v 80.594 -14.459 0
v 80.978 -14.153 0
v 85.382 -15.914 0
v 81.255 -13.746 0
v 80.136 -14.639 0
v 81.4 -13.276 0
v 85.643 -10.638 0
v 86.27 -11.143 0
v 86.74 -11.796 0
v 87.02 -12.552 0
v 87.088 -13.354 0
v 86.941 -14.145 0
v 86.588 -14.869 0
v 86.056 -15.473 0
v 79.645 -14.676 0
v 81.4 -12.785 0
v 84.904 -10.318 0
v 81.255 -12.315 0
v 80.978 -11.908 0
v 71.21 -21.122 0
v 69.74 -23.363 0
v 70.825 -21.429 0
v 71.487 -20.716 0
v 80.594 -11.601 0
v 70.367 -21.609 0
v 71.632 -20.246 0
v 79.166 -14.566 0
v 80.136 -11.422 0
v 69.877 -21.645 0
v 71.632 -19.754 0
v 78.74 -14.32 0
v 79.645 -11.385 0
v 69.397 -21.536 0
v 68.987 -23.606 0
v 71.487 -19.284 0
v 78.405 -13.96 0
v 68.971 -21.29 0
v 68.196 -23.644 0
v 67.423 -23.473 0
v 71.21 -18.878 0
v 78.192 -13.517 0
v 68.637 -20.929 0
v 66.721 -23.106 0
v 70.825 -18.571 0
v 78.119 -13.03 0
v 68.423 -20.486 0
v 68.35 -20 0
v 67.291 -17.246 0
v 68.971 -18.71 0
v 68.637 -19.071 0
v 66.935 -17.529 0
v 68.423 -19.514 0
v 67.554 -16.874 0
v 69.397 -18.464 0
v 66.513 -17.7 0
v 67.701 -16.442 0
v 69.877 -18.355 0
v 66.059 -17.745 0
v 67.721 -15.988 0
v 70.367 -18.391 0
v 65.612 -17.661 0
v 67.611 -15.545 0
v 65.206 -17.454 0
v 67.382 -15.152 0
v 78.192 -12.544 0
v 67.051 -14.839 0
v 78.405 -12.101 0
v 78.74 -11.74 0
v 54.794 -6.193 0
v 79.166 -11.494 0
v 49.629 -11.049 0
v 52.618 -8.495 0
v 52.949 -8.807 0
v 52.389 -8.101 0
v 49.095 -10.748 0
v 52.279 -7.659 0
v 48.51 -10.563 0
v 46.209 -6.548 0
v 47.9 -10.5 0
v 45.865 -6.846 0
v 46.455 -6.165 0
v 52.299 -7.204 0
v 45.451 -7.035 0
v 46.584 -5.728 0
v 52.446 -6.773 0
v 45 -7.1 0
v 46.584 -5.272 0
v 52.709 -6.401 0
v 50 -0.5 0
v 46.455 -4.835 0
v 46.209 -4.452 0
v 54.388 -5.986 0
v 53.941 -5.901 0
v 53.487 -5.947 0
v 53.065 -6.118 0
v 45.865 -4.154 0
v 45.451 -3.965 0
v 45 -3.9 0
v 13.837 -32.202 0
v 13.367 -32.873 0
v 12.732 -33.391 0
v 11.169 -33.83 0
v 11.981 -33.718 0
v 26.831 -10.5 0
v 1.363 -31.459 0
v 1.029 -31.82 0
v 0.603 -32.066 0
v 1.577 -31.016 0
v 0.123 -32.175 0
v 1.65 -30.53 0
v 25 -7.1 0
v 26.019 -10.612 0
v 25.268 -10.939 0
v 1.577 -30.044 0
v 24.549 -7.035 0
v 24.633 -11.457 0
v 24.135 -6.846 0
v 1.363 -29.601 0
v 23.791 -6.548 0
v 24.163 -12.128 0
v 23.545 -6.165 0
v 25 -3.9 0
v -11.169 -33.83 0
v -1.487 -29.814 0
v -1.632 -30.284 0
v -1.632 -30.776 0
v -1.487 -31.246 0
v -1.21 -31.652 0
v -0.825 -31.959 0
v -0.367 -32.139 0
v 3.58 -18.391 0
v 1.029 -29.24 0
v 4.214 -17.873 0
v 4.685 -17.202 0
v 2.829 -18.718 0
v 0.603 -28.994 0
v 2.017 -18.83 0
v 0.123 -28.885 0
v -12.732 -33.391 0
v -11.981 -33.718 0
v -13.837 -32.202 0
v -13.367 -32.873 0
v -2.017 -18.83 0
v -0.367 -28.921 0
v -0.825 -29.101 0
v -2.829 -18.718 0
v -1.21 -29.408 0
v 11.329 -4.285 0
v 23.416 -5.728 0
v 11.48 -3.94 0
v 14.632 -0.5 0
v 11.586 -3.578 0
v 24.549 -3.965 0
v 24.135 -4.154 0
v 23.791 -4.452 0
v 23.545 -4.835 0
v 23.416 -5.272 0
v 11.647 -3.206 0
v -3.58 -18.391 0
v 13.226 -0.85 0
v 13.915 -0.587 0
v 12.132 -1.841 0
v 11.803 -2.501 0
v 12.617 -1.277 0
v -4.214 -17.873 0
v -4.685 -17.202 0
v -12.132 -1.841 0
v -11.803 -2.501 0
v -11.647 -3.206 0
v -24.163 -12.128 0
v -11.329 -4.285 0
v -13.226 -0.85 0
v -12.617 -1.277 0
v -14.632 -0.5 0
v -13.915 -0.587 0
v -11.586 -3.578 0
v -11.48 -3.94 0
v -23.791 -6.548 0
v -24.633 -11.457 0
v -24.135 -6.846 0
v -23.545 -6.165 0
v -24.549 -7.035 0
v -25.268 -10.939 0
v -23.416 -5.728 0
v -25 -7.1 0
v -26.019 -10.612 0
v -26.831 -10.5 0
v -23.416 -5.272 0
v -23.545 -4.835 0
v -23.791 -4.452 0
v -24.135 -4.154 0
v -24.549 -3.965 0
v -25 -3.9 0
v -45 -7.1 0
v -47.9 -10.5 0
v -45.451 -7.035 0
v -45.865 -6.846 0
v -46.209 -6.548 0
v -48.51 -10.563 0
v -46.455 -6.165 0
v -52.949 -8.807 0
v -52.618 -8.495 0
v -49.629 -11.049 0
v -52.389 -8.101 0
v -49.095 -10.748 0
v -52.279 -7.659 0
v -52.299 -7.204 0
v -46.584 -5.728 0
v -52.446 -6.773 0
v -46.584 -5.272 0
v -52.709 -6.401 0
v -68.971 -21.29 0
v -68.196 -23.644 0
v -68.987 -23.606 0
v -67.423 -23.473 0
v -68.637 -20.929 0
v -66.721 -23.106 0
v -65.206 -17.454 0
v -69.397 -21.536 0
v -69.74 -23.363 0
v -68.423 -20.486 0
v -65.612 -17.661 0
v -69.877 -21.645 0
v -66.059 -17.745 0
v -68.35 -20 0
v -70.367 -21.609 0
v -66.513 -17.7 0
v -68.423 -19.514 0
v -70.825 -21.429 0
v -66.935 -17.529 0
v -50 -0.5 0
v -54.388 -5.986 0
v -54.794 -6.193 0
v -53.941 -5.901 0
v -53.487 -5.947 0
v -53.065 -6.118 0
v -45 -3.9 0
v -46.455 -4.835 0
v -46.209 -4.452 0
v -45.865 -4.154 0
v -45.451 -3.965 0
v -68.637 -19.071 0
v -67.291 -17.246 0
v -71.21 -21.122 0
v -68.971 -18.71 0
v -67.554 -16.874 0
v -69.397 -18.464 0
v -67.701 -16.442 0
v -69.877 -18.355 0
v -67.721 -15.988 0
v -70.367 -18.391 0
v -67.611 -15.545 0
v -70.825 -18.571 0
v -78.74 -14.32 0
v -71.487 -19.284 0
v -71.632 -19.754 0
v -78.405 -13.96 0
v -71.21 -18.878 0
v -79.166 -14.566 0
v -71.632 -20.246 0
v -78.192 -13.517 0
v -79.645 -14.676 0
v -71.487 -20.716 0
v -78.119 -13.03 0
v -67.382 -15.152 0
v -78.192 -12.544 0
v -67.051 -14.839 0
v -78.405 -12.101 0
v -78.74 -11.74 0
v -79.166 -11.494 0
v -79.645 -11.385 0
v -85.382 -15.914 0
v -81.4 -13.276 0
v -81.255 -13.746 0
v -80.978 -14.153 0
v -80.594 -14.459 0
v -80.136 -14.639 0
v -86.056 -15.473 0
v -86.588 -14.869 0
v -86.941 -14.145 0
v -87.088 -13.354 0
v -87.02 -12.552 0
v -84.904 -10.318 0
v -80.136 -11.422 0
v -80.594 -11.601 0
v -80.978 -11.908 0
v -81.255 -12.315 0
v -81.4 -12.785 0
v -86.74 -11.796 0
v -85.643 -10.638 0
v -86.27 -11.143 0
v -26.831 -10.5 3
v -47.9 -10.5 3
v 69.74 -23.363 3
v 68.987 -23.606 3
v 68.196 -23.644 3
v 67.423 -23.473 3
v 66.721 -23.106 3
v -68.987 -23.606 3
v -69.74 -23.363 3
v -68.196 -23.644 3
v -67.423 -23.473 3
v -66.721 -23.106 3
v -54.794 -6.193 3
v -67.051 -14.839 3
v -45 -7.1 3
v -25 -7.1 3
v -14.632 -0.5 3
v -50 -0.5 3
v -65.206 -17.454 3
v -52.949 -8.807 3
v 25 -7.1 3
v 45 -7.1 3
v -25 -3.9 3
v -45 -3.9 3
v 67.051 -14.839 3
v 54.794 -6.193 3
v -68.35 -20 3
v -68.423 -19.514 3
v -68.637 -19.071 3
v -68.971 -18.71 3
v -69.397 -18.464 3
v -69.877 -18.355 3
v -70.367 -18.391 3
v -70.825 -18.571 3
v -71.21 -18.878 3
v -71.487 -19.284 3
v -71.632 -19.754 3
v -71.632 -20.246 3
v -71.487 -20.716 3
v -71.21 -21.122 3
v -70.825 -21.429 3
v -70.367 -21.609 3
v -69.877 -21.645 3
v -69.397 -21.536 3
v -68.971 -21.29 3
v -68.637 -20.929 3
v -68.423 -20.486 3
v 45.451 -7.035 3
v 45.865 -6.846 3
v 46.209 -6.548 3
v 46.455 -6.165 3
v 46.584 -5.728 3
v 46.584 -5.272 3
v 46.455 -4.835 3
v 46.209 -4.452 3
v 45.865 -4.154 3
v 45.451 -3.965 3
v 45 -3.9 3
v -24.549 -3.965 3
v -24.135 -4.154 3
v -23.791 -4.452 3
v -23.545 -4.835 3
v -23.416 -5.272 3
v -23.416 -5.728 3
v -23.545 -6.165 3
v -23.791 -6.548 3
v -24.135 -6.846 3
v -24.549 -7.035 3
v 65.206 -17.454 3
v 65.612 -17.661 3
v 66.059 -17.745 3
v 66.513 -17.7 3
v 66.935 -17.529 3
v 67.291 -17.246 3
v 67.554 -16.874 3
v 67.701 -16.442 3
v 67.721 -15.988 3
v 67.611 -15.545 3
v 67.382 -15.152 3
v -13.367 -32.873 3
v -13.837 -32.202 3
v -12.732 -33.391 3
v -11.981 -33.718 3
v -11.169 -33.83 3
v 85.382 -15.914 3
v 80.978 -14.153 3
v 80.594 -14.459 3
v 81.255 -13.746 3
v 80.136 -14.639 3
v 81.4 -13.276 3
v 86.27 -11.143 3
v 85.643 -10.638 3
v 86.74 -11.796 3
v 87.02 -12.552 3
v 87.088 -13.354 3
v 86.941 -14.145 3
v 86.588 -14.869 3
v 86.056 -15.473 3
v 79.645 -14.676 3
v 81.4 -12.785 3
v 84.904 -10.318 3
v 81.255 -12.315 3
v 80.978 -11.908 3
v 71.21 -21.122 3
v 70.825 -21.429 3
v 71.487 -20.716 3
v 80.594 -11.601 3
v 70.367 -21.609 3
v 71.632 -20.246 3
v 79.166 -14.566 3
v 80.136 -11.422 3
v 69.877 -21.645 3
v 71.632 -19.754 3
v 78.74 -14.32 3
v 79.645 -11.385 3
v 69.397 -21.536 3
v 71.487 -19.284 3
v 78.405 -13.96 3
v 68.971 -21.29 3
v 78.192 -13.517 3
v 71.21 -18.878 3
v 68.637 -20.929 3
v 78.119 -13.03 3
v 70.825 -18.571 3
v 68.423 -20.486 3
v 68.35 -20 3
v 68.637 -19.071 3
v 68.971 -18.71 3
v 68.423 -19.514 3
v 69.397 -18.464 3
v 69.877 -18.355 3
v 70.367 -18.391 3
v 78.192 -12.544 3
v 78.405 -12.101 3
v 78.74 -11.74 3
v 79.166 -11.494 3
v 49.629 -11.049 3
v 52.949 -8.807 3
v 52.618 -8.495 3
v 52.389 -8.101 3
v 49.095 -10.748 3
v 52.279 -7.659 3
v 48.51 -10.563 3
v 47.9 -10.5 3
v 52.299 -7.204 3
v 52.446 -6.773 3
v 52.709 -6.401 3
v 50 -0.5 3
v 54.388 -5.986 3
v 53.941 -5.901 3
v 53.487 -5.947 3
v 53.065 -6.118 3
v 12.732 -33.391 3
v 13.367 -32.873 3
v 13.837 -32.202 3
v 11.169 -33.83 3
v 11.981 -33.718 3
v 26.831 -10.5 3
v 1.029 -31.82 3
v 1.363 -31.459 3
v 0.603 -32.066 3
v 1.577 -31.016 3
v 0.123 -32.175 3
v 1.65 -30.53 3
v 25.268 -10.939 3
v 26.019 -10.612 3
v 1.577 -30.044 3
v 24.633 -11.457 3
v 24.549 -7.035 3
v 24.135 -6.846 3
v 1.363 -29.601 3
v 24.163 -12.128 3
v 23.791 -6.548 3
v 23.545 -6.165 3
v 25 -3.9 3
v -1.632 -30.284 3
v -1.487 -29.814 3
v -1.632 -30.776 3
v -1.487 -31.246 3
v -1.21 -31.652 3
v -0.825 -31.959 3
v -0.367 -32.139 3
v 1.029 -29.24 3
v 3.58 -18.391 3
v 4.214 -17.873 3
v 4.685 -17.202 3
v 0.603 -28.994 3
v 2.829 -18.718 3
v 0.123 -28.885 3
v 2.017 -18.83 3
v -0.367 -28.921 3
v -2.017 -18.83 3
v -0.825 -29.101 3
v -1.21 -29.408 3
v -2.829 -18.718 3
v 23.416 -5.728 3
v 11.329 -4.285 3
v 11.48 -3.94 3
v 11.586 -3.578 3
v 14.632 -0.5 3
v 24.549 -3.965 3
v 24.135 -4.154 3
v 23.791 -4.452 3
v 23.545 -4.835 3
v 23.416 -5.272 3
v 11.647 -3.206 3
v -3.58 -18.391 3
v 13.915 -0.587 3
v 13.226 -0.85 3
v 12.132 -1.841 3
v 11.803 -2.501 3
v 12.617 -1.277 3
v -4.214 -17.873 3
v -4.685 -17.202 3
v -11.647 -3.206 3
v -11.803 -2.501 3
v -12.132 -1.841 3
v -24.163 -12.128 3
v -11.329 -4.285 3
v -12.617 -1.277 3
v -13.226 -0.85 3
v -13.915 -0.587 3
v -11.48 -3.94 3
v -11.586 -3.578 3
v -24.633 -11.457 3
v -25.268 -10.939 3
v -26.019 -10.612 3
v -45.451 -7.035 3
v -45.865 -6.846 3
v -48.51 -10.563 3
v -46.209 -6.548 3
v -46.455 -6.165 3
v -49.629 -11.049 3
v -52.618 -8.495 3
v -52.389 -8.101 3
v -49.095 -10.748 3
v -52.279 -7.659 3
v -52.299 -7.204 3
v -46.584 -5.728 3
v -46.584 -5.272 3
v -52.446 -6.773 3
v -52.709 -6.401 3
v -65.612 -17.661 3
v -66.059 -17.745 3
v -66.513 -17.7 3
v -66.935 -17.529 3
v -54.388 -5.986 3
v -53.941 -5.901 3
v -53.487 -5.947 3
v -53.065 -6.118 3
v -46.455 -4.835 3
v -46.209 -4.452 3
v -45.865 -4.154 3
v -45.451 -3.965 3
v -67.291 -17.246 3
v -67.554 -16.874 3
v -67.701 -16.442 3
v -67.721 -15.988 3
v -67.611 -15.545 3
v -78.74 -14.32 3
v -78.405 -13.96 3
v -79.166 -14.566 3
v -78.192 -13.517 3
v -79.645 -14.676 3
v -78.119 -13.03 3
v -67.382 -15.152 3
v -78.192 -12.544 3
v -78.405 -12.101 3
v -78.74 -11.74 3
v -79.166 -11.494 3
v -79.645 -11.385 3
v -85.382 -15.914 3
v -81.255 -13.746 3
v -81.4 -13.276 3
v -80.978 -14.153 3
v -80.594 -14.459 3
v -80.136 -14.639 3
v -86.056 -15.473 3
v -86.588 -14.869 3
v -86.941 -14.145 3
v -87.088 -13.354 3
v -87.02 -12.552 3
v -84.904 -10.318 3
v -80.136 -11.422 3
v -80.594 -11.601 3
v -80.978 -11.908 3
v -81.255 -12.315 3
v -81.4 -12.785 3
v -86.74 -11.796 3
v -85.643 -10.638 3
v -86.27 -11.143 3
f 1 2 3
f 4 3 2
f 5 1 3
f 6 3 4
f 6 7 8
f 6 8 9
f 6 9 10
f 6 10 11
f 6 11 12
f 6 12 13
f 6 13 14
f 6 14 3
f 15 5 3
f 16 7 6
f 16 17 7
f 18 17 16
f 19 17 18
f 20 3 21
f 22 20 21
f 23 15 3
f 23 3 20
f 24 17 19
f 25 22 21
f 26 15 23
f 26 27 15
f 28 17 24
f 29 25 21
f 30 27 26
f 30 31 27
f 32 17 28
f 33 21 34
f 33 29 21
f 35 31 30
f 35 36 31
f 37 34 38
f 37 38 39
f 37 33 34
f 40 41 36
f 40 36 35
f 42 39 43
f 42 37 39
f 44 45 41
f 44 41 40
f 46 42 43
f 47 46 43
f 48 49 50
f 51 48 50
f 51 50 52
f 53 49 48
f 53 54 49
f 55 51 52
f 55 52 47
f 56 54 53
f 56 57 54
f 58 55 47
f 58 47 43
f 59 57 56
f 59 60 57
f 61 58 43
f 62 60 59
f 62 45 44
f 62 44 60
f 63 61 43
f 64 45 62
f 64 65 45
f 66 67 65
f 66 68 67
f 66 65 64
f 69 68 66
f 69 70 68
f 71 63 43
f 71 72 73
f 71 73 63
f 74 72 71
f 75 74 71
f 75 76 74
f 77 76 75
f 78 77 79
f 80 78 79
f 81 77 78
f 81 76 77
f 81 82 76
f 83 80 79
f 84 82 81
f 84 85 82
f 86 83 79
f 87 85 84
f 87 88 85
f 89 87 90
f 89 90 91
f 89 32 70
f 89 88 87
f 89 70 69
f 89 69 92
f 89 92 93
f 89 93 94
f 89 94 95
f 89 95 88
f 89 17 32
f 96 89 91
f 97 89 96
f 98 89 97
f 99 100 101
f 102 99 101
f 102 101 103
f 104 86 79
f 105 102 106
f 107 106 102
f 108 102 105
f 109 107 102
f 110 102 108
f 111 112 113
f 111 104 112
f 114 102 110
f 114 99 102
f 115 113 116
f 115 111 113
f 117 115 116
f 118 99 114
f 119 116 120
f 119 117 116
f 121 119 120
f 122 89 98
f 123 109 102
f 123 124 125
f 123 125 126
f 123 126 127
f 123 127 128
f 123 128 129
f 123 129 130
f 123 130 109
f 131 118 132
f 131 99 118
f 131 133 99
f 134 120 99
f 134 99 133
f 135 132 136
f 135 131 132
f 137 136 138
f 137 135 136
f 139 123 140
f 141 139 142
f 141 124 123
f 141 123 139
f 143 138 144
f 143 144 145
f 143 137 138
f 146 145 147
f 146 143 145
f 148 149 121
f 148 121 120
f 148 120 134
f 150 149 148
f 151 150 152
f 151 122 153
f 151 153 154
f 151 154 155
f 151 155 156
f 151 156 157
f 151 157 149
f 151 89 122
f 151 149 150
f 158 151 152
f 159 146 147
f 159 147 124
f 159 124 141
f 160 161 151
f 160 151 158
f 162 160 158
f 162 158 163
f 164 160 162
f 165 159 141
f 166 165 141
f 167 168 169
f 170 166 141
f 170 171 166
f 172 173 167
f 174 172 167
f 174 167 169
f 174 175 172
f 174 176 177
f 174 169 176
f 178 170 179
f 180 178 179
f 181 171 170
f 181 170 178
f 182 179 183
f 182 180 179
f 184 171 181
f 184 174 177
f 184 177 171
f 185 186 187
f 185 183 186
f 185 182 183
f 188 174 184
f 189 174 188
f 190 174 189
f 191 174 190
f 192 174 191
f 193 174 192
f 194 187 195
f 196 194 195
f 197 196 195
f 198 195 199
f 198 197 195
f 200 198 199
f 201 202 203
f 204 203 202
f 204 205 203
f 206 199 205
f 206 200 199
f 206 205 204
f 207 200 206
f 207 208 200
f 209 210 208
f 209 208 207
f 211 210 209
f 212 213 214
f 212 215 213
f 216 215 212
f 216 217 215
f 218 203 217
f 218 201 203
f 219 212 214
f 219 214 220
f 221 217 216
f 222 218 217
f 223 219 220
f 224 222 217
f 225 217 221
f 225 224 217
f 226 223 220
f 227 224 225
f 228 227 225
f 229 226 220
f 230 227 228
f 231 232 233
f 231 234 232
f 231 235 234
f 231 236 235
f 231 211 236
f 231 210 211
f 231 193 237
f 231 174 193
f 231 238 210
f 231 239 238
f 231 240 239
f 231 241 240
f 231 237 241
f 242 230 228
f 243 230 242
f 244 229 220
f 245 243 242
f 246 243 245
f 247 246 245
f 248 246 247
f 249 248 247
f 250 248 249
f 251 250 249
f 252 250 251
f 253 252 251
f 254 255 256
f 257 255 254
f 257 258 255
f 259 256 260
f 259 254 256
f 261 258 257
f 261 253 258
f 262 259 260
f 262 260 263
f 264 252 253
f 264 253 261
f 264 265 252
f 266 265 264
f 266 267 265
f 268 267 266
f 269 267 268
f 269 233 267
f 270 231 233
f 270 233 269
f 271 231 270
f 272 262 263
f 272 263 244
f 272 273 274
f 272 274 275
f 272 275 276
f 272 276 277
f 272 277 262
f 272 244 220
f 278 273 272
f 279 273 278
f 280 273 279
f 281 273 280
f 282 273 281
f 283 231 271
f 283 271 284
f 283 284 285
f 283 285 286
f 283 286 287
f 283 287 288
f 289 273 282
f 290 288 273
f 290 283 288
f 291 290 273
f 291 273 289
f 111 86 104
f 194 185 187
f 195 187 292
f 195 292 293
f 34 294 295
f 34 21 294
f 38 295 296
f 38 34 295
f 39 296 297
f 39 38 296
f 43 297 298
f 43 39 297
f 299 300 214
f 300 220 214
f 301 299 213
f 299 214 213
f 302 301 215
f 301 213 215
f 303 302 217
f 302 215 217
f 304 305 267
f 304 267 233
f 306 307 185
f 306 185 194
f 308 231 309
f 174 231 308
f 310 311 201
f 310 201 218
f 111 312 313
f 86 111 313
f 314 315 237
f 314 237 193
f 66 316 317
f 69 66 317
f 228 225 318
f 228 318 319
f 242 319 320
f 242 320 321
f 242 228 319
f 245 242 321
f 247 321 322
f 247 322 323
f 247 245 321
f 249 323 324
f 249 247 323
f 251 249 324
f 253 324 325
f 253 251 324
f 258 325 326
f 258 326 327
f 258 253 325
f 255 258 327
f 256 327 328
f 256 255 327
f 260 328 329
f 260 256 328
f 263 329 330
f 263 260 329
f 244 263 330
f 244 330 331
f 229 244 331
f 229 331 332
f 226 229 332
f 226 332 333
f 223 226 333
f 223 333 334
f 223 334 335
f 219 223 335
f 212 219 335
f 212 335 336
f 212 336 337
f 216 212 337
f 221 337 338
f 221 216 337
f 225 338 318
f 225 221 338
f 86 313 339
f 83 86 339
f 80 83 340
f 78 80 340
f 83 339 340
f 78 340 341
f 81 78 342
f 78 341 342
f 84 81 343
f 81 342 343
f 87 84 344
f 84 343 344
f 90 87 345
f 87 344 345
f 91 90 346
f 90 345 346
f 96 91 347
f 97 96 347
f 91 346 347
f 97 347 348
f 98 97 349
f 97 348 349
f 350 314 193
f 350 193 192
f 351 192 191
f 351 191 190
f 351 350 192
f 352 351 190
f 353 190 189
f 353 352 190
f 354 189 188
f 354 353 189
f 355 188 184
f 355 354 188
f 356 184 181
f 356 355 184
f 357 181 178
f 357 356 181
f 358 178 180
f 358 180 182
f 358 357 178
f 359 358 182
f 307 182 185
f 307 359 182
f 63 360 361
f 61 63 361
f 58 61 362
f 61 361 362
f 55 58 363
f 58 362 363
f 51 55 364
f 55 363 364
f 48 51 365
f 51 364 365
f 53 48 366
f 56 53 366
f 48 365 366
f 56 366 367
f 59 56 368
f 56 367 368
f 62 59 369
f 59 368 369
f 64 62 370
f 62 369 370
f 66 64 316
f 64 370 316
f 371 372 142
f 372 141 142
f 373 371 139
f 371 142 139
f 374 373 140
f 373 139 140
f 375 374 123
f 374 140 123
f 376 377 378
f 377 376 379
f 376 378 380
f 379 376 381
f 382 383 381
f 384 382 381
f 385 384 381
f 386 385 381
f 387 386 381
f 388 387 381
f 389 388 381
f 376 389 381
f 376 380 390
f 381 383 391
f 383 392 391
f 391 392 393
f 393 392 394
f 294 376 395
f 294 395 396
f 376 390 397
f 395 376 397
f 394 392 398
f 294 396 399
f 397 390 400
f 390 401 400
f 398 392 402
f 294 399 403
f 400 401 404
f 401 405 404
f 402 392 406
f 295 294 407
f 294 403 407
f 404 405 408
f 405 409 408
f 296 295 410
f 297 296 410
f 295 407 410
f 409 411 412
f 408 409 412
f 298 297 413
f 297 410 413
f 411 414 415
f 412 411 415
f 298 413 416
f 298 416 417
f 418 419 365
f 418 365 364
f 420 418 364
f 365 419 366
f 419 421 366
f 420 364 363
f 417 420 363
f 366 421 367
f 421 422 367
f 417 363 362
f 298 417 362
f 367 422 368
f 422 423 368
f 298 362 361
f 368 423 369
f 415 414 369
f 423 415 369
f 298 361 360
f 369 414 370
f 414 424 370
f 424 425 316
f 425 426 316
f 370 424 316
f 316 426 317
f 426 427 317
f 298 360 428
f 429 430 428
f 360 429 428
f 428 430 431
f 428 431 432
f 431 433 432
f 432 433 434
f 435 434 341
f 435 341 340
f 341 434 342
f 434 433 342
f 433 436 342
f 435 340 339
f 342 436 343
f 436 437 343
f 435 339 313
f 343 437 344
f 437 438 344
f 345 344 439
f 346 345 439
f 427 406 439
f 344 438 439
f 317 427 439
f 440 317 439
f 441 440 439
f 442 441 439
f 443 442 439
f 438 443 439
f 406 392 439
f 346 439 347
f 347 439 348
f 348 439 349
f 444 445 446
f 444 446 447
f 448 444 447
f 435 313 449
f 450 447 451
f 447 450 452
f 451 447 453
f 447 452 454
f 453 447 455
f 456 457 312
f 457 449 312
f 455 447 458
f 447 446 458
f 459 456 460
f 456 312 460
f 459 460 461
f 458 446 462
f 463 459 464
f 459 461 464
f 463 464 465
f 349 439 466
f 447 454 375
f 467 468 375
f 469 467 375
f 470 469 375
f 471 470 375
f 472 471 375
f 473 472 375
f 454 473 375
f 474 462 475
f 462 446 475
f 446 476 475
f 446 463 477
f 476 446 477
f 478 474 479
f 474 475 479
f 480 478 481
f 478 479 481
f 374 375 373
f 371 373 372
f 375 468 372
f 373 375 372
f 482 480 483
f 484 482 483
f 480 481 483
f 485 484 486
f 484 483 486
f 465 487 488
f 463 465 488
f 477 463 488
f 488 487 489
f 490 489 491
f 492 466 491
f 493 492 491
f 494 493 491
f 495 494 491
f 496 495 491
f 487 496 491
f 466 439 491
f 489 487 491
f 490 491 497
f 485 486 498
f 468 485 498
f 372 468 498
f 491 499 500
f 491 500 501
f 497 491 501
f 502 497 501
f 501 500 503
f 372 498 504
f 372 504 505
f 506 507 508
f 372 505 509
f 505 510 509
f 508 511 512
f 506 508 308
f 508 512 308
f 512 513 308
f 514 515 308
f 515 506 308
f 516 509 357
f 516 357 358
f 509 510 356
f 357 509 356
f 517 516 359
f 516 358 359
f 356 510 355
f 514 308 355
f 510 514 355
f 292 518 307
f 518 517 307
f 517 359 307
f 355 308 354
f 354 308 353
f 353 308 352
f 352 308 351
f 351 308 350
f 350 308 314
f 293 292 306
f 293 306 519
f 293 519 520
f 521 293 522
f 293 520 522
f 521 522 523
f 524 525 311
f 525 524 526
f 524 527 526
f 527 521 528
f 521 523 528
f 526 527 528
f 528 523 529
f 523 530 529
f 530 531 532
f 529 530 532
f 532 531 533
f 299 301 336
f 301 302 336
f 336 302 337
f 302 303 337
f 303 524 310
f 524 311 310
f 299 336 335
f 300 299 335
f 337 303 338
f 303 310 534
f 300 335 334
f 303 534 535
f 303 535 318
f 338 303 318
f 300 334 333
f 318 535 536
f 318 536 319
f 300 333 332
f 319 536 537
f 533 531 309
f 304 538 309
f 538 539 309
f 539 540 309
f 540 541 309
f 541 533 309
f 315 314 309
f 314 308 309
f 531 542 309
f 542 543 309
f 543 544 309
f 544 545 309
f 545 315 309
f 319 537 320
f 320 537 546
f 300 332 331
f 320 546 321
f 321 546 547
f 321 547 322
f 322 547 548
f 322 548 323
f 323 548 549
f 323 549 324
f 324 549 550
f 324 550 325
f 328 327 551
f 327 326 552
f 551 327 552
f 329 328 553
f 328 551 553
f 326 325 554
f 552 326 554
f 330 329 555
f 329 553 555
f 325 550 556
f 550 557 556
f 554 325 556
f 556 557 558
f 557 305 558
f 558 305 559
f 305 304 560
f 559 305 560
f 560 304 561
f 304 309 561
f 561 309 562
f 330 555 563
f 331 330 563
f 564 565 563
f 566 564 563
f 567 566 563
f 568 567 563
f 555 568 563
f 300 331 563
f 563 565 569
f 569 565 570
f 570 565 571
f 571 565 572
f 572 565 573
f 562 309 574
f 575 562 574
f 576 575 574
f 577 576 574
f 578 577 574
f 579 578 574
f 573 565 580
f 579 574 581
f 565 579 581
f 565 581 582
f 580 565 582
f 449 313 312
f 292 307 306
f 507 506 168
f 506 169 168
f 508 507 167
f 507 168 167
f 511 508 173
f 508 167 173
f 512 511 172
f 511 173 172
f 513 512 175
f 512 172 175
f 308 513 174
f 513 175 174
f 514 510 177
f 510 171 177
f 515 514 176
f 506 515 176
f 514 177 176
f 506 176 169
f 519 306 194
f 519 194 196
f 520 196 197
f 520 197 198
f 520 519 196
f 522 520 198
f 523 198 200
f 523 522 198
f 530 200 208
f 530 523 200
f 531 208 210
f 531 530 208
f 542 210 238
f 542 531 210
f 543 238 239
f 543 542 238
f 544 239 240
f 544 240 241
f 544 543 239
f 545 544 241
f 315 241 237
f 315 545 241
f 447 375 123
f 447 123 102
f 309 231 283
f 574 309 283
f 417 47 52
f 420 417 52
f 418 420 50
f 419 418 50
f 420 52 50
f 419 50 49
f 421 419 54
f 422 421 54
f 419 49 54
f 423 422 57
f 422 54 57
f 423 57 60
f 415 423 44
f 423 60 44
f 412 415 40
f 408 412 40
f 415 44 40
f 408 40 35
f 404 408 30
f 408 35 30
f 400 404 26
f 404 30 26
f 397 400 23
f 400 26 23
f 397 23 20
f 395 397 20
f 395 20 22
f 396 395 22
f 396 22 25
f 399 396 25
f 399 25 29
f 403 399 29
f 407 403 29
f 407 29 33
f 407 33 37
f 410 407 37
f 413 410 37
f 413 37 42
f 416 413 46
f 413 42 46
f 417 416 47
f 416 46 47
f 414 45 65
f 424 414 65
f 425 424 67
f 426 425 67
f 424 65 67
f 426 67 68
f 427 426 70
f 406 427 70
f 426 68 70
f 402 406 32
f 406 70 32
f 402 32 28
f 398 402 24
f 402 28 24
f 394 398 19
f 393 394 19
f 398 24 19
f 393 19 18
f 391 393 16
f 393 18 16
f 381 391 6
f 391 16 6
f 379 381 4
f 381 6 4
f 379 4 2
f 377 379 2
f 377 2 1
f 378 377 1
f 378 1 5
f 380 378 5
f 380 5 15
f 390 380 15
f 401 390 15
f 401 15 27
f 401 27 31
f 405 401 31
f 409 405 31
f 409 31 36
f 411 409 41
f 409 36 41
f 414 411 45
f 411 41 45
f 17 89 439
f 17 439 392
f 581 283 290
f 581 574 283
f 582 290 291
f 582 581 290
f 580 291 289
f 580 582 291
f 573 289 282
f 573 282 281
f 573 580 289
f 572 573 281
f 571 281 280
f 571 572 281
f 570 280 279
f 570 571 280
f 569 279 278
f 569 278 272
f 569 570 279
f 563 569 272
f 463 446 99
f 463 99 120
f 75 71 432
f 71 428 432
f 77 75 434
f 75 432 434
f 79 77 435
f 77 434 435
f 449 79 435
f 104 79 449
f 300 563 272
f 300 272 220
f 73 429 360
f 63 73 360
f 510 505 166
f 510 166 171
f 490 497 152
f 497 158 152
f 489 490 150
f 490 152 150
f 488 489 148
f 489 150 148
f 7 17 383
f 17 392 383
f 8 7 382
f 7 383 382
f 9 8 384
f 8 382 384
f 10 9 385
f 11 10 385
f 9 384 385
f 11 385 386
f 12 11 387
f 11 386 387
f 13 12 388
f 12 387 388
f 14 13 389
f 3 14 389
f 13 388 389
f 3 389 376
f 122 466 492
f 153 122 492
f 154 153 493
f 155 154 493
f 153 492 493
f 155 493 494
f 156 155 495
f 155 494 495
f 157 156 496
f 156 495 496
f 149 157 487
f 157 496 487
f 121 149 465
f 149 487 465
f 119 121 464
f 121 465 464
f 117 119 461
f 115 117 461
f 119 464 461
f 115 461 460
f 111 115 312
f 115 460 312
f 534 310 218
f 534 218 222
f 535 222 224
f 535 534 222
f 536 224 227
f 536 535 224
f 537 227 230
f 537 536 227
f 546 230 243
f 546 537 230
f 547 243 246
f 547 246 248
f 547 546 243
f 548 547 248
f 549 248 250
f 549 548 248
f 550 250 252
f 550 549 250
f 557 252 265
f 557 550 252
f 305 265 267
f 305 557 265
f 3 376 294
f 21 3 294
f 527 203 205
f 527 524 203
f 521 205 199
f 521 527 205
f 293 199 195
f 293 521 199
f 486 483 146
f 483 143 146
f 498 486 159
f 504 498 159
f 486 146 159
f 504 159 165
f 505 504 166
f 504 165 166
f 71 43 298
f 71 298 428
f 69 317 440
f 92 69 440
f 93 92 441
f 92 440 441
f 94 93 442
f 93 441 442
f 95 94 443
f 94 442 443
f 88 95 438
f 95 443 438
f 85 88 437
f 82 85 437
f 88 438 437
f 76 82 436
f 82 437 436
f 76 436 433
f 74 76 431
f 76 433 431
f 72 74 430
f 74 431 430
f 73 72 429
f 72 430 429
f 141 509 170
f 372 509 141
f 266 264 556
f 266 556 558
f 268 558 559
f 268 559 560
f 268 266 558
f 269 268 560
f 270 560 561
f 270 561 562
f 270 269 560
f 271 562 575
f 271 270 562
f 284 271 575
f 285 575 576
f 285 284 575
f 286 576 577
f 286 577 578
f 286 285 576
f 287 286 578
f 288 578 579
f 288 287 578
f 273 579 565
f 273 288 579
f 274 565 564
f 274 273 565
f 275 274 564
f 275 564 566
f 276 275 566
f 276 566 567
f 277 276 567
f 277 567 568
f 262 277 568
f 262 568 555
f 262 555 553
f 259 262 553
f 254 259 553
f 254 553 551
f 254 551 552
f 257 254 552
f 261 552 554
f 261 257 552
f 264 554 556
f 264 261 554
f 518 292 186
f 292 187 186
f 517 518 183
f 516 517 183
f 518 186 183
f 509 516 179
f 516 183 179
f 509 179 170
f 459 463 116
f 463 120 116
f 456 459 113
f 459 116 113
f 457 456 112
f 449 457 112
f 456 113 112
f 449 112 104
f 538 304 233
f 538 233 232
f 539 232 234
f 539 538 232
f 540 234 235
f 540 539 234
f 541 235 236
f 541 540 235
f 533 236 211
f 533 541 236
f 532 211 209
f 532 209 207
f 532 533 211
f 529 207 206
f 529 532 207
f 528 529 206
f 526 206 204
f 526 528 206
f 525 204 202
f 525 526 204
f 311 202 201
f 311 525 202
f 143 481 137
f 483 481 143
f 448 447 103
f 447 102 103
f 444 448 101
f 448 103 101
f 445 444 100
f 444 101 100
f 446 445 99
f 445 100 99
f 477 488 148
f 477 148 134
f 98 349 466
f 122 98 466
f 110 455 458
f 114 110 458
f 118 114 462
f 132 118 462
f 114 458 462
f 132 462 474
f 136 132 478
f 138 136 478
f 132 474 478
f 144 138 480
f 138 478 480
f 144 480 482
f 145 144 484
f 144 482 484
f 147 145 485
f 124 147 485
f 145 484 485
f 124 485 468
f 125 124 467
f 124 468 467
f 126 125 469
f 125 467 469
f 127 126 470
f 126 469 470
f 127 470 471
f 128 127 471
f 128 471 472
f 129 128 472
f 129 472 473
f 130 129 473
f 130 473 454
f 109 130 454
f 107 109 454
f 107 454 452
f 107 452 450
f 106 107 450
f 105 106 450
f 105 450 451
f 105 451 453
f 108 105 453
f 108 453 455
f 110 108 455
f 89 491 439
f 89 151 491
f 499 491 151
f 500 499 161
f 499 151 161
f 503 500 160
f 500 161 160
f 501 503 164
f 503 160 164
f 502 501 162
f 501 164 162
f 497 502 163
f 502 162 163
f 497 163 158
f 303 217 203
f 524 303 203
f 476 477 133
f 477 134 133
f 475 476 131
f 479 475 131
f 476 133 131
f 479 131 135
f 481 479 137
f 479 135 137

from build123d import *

# Parameters (mm, degrees)
SKETCH_1_R          = 1.65
EXTRUDE_1_DEPTH     = 3
CUT_EXTRUDE_1_DEPTH = 3
EXTRUDE_2_DEPTH     = 3
CUT_EXTRUDE_2_DEPTH = 3
FILLET_1_R          = 3
FILLET_2_R          = 3
SKETCH_7_R          = 1.65
CUT_EXTRUDE_4_DEPTH = 10
CUT_EXTRUDE_3_DEPTH = 3


with BuildPart() as part:
    # 草图1 → 凸台-拉伸1 (new body)
    with BuildSketch(Plane.XY):
        Polygon((-92.59237164, -12.480070197), (-72.241164341, -27), (-48.851597939, -10.5), (0, -10.5), (0, -0.5), (-50, -0.5), align=None)
        with Locations((-79.768579503, -13.030433694)):
            Circle(SKETCH_1_R, mode=Mode.SUBTRACT)
        with Locations((-70, -20)):
            Circle(SKETCH_1_R, mode=Mode.SUBTRACT)
    extrude(amount=EXTRUDE_1_DEPTH)

    # 镜向1: part across plane


with BuildPart() as part_1:
    add(part.part)
    add(part.part.mirror(Plane(origin=(0, -0.5, 3), x_dir=(0, 0, 1), z_dir=(-1, 0, 0))))

    # 草图2 → 切除-拉伸1 (cut)
    with BuildSketch(Plane.XY.offset(3)):
        Polygon((-92.59237164, -12.480070197), (-68.155479007, -24.11778291), (-72.241164341, -27), align=None)
        Polygon((92.59237164, -12.480070197), (68.155479007, -24.11778291), (72.241164341, -27), align=None)
    extrude(amount=-CUT_EXTRUDE_1_DEPTH, mode=Mode.SUBTRACT)

    # 草图3 → 凸台-拉伸2 (add)
    with BuildSketch(Plane.XY.offset(3)):
        Polygon((-25, -10.5), (-13, -33.83), (13, -33.83), (25, -10.5), align=None)
    extrude(amount=-EXTRUDE_2_DEPTH)

    # 草图4 → 切除-拉伸2 (cut)
    with BuildSketch(Plane.XY.offset(3)):
        Polygon((-11.661081625, -3.639004694), (-11.661081625, -0.5), (11.661081625, -0.5), (11.661081625, -3.639004694), (3.847453521, -18.83), (-3.847453521, -18.83), align=None)
    extrude(amount=-CUT_EXTRUDE_2_DEPTH, mode=Mode.SUBTRACT)

    # 圆角1
    fillet_1_edges = [part_1.edges().sort_by_distance(p)[0] for p in [
        (-48.851597939, -10.5, 1.5),
        (-92.59237164, -12.480070197, 1.5),
        (92.59237164, -12.480070197, 1.5),
        (48.851597939, -10.5, 1.5),
        (-68.155479007, -24.11778291, 1.5),
        (68.155479007, -24.11778291, 1.5),
        (-13, -33.83, 1.5),
        (13, -33.83, 1.5),
        (25, -10.5, 1.5),
        (-25, -10.5, 1.5),
        (11.661081625, -3.639004694, 1.5),
        (3.847453521, -18.83, 1.5),
        (-3.847453521, -18.83, 1.5),
        (-11.661081625, -3.639004694, 1.5),
    ]]
    fillet(fillet_1_edges, radius=FILLET_1_R)

    # 圆角2
    fillet_2_edges = [part_1.edges().sort_by_distance(p)[0] for p in [
        (11.661081625, -0.5, 1.5),
        (-11.661081625, -0.5, 1.5),
    ]]
    fillet(fillet_2_edges, radius=FILLET_2_R)

    # 草图7 → 切除-拉伸4 (cut)
    with BuildSketch(Plane.XY.offset(3)):
        with Locations((0, -30.53)):
            Circle(SKETCH_7_R)
    extrude(amount=-CUT_EXTRUDE_4_DEPTH, mode=Mode.SUBTRACT)

    # 草图5 → 切除-拉伸3 (cut)
    with BuildSketch(Plane.XY.offset(3)):
        with BuildLine():
            Line((-45, -3.9), (-25, -3.9))
            ThreePointArc((-25, -3.9), (-23.4, -5.5), (-25, -7.1))
            Line((-25, -7.1), (-45, -7.1))
            ThreePointArc((-45, -7.1), (-46.6, -5.5), (-45, -3.9))
        make_face()
        with BuildLine():
            Line((-67.050837469, -14.839231963), (-54.793781468, -6.192580693))
            ThreePointArc((-54.793781468, -6.192580693), (-52.564052692, -6.577690531), (-52.949162531, -8.807419307))
            Line((-52.949162531, -8.807419307), (-65.206218532, -17.454070576))
            ThreePointArc((-65.206218532, -17.454070576), (-67.435947308, -17.068960738), (-67.050837469, -14.839231963))
        make_face()
    cut_extrude_3 = extrude(amount=-CUT_EXTRUDE_3_DEPTH, mode=Mode.SUBTRACT)

    # 镜向2: 切除-拉伸3 across plane
    add(cut_extrude_3.mirror(Plane(origin=(0, 0, 0), x_dir=(0, 0, 1), z_dir=(1, 0, 0))), mode=Mode.SUBTRACT)


solid = part_1.part
